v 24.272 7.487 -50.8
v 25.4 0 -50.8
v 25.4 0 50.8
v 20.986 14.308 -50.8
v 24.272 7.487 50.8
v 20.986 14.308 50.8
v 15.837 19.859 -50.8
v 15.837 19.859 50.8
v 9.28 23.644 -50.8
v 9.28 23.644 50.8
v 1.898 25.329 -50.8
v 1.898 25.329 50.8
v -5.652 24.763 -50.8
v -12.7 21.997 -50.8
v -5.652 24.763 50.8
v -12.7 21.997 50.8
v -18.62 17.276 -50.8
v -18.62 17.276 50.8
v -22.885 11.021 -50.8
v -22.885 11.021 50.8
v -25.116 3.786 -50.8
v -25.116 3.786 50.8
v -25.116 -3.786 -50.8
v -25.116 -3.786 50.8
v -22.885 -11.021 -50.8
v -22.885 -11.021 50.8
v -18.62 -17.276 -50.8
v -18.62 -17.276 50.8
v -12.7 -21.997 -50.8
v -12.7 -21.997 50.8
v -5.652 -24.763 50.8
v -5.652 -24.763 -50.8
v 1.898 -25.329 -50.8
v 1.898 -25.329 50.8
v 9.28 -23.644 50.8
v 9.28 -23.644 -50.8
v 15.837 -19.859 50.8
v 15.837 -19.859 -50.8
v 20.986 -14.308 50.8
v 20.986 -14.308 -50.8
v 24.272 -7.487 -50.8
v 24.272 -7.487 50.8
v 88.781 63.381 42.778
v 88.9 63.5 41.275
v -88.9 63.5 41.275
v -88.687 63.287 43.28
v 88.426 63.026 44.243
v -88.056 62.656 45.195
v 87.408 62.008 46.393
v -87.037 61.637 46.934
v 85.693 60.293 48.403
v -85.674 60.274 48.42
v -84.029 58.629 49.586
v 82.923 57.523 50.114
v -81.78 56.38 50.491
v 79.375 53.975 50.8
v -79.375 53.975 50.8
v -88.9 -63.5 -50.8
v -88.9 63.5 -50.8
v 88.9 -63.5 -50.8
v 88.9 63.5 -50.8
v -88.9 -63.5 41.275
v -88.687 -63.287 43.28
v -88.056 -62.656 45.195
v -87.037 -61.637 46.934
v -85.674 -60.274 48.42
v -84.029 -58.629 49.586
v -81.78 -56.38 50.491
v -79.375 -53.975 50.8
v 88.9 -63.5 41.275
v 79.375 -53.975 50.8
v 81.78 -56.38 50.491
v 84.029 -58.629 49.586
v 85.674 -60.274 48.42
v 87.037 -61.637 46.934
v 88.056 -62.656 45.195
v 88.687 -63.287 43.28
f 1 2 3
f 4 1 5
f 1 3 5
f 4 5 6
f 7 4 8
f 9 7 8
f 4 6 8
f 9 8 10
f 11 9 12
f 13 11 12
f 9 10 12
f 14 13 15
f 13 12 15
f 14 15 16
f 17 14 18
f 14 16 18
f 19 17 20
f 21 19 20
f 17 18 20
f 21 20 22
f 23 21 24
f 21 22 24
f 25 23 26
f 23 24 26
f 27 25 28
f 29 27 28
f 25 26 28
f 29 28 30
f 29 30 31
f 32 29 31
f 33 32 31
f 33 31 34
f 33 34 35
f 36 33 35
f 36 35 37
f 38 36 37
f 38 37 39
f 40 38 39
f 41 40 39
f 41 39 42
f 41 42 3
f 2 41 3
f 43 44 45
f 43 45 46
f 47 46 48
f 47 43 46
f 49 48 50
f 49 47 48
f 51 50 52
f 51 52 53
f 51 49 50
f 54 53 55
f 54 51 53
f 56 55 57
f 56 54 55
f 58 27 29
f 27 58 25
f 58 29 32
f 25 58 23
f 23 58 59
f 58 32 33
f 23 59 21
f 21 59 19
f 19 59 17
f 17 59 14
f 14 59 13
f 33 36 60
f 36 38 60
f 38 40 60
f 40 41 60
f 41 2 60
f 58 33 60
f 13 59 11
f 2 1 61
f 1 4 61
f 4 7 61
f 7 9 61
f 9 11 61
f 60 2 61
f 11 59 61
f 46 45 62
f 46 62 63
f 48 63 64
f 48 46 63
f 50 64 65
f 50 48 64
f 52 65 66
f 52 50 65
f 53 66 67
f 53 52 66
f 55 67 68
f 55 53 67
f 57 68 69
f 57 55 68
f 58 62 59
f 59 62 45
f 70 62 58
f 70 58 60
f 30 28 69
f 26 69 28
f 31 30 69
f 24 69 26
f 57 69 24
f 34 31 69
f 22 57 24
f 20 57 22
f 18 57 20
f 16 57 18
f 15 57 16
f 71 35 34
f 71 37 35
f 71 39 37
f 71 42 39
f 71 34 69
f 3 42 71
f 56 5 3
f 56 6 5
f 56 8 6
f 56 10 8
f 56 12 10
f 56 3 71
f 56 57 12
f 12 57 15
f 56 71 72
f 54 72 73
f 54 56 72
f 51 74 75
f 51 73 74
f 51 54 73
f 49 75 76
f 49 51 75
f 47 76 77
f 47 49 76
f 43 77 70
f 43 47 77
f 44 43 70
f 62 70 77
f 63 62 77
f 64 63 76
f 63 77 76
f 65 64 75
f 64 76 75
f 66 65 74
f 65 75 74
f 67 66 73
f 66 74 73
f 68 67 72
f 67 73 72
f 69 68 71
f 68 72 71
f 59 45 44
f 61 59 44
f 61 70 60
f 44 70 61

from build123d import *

# Parameters (mm, degrees)
F0_W     = 177.8
F0_H     = 127
F1_DEPTH = 50.8
F2_R     = 25.4
F3_DEPTH = 101.601
F4_R     = 9.525


with BuildPart() as f1:
    # F0 (on Top) → F1 (new body, symmetric)
    with BuildSketch(Plane.XY):
        Rectangle(F0_W, F0_H)
    extrude(amount=F1_DEPTH, both=True)

    # F2 (on face) → F3 (cut, through all)
    with BuildSketch(Plane.XY.offset(50.8)):
        Circle(F2_R)
    extrude(amount=-F3_DEPTH, mode=Mode.SUBTRACT)

    # F4
    f4_edges = [f1.edges().sort_by_distance(p)[0] for p in [
        (0, -63.5, 50.8),
        (-88.9, 0, 50.8),
        (88.9, 0, 50.8),
        (0, 63.5, 50.8),
    ]]
    fillet(f4_edges, radius=F4_R)


solid = f1.part
